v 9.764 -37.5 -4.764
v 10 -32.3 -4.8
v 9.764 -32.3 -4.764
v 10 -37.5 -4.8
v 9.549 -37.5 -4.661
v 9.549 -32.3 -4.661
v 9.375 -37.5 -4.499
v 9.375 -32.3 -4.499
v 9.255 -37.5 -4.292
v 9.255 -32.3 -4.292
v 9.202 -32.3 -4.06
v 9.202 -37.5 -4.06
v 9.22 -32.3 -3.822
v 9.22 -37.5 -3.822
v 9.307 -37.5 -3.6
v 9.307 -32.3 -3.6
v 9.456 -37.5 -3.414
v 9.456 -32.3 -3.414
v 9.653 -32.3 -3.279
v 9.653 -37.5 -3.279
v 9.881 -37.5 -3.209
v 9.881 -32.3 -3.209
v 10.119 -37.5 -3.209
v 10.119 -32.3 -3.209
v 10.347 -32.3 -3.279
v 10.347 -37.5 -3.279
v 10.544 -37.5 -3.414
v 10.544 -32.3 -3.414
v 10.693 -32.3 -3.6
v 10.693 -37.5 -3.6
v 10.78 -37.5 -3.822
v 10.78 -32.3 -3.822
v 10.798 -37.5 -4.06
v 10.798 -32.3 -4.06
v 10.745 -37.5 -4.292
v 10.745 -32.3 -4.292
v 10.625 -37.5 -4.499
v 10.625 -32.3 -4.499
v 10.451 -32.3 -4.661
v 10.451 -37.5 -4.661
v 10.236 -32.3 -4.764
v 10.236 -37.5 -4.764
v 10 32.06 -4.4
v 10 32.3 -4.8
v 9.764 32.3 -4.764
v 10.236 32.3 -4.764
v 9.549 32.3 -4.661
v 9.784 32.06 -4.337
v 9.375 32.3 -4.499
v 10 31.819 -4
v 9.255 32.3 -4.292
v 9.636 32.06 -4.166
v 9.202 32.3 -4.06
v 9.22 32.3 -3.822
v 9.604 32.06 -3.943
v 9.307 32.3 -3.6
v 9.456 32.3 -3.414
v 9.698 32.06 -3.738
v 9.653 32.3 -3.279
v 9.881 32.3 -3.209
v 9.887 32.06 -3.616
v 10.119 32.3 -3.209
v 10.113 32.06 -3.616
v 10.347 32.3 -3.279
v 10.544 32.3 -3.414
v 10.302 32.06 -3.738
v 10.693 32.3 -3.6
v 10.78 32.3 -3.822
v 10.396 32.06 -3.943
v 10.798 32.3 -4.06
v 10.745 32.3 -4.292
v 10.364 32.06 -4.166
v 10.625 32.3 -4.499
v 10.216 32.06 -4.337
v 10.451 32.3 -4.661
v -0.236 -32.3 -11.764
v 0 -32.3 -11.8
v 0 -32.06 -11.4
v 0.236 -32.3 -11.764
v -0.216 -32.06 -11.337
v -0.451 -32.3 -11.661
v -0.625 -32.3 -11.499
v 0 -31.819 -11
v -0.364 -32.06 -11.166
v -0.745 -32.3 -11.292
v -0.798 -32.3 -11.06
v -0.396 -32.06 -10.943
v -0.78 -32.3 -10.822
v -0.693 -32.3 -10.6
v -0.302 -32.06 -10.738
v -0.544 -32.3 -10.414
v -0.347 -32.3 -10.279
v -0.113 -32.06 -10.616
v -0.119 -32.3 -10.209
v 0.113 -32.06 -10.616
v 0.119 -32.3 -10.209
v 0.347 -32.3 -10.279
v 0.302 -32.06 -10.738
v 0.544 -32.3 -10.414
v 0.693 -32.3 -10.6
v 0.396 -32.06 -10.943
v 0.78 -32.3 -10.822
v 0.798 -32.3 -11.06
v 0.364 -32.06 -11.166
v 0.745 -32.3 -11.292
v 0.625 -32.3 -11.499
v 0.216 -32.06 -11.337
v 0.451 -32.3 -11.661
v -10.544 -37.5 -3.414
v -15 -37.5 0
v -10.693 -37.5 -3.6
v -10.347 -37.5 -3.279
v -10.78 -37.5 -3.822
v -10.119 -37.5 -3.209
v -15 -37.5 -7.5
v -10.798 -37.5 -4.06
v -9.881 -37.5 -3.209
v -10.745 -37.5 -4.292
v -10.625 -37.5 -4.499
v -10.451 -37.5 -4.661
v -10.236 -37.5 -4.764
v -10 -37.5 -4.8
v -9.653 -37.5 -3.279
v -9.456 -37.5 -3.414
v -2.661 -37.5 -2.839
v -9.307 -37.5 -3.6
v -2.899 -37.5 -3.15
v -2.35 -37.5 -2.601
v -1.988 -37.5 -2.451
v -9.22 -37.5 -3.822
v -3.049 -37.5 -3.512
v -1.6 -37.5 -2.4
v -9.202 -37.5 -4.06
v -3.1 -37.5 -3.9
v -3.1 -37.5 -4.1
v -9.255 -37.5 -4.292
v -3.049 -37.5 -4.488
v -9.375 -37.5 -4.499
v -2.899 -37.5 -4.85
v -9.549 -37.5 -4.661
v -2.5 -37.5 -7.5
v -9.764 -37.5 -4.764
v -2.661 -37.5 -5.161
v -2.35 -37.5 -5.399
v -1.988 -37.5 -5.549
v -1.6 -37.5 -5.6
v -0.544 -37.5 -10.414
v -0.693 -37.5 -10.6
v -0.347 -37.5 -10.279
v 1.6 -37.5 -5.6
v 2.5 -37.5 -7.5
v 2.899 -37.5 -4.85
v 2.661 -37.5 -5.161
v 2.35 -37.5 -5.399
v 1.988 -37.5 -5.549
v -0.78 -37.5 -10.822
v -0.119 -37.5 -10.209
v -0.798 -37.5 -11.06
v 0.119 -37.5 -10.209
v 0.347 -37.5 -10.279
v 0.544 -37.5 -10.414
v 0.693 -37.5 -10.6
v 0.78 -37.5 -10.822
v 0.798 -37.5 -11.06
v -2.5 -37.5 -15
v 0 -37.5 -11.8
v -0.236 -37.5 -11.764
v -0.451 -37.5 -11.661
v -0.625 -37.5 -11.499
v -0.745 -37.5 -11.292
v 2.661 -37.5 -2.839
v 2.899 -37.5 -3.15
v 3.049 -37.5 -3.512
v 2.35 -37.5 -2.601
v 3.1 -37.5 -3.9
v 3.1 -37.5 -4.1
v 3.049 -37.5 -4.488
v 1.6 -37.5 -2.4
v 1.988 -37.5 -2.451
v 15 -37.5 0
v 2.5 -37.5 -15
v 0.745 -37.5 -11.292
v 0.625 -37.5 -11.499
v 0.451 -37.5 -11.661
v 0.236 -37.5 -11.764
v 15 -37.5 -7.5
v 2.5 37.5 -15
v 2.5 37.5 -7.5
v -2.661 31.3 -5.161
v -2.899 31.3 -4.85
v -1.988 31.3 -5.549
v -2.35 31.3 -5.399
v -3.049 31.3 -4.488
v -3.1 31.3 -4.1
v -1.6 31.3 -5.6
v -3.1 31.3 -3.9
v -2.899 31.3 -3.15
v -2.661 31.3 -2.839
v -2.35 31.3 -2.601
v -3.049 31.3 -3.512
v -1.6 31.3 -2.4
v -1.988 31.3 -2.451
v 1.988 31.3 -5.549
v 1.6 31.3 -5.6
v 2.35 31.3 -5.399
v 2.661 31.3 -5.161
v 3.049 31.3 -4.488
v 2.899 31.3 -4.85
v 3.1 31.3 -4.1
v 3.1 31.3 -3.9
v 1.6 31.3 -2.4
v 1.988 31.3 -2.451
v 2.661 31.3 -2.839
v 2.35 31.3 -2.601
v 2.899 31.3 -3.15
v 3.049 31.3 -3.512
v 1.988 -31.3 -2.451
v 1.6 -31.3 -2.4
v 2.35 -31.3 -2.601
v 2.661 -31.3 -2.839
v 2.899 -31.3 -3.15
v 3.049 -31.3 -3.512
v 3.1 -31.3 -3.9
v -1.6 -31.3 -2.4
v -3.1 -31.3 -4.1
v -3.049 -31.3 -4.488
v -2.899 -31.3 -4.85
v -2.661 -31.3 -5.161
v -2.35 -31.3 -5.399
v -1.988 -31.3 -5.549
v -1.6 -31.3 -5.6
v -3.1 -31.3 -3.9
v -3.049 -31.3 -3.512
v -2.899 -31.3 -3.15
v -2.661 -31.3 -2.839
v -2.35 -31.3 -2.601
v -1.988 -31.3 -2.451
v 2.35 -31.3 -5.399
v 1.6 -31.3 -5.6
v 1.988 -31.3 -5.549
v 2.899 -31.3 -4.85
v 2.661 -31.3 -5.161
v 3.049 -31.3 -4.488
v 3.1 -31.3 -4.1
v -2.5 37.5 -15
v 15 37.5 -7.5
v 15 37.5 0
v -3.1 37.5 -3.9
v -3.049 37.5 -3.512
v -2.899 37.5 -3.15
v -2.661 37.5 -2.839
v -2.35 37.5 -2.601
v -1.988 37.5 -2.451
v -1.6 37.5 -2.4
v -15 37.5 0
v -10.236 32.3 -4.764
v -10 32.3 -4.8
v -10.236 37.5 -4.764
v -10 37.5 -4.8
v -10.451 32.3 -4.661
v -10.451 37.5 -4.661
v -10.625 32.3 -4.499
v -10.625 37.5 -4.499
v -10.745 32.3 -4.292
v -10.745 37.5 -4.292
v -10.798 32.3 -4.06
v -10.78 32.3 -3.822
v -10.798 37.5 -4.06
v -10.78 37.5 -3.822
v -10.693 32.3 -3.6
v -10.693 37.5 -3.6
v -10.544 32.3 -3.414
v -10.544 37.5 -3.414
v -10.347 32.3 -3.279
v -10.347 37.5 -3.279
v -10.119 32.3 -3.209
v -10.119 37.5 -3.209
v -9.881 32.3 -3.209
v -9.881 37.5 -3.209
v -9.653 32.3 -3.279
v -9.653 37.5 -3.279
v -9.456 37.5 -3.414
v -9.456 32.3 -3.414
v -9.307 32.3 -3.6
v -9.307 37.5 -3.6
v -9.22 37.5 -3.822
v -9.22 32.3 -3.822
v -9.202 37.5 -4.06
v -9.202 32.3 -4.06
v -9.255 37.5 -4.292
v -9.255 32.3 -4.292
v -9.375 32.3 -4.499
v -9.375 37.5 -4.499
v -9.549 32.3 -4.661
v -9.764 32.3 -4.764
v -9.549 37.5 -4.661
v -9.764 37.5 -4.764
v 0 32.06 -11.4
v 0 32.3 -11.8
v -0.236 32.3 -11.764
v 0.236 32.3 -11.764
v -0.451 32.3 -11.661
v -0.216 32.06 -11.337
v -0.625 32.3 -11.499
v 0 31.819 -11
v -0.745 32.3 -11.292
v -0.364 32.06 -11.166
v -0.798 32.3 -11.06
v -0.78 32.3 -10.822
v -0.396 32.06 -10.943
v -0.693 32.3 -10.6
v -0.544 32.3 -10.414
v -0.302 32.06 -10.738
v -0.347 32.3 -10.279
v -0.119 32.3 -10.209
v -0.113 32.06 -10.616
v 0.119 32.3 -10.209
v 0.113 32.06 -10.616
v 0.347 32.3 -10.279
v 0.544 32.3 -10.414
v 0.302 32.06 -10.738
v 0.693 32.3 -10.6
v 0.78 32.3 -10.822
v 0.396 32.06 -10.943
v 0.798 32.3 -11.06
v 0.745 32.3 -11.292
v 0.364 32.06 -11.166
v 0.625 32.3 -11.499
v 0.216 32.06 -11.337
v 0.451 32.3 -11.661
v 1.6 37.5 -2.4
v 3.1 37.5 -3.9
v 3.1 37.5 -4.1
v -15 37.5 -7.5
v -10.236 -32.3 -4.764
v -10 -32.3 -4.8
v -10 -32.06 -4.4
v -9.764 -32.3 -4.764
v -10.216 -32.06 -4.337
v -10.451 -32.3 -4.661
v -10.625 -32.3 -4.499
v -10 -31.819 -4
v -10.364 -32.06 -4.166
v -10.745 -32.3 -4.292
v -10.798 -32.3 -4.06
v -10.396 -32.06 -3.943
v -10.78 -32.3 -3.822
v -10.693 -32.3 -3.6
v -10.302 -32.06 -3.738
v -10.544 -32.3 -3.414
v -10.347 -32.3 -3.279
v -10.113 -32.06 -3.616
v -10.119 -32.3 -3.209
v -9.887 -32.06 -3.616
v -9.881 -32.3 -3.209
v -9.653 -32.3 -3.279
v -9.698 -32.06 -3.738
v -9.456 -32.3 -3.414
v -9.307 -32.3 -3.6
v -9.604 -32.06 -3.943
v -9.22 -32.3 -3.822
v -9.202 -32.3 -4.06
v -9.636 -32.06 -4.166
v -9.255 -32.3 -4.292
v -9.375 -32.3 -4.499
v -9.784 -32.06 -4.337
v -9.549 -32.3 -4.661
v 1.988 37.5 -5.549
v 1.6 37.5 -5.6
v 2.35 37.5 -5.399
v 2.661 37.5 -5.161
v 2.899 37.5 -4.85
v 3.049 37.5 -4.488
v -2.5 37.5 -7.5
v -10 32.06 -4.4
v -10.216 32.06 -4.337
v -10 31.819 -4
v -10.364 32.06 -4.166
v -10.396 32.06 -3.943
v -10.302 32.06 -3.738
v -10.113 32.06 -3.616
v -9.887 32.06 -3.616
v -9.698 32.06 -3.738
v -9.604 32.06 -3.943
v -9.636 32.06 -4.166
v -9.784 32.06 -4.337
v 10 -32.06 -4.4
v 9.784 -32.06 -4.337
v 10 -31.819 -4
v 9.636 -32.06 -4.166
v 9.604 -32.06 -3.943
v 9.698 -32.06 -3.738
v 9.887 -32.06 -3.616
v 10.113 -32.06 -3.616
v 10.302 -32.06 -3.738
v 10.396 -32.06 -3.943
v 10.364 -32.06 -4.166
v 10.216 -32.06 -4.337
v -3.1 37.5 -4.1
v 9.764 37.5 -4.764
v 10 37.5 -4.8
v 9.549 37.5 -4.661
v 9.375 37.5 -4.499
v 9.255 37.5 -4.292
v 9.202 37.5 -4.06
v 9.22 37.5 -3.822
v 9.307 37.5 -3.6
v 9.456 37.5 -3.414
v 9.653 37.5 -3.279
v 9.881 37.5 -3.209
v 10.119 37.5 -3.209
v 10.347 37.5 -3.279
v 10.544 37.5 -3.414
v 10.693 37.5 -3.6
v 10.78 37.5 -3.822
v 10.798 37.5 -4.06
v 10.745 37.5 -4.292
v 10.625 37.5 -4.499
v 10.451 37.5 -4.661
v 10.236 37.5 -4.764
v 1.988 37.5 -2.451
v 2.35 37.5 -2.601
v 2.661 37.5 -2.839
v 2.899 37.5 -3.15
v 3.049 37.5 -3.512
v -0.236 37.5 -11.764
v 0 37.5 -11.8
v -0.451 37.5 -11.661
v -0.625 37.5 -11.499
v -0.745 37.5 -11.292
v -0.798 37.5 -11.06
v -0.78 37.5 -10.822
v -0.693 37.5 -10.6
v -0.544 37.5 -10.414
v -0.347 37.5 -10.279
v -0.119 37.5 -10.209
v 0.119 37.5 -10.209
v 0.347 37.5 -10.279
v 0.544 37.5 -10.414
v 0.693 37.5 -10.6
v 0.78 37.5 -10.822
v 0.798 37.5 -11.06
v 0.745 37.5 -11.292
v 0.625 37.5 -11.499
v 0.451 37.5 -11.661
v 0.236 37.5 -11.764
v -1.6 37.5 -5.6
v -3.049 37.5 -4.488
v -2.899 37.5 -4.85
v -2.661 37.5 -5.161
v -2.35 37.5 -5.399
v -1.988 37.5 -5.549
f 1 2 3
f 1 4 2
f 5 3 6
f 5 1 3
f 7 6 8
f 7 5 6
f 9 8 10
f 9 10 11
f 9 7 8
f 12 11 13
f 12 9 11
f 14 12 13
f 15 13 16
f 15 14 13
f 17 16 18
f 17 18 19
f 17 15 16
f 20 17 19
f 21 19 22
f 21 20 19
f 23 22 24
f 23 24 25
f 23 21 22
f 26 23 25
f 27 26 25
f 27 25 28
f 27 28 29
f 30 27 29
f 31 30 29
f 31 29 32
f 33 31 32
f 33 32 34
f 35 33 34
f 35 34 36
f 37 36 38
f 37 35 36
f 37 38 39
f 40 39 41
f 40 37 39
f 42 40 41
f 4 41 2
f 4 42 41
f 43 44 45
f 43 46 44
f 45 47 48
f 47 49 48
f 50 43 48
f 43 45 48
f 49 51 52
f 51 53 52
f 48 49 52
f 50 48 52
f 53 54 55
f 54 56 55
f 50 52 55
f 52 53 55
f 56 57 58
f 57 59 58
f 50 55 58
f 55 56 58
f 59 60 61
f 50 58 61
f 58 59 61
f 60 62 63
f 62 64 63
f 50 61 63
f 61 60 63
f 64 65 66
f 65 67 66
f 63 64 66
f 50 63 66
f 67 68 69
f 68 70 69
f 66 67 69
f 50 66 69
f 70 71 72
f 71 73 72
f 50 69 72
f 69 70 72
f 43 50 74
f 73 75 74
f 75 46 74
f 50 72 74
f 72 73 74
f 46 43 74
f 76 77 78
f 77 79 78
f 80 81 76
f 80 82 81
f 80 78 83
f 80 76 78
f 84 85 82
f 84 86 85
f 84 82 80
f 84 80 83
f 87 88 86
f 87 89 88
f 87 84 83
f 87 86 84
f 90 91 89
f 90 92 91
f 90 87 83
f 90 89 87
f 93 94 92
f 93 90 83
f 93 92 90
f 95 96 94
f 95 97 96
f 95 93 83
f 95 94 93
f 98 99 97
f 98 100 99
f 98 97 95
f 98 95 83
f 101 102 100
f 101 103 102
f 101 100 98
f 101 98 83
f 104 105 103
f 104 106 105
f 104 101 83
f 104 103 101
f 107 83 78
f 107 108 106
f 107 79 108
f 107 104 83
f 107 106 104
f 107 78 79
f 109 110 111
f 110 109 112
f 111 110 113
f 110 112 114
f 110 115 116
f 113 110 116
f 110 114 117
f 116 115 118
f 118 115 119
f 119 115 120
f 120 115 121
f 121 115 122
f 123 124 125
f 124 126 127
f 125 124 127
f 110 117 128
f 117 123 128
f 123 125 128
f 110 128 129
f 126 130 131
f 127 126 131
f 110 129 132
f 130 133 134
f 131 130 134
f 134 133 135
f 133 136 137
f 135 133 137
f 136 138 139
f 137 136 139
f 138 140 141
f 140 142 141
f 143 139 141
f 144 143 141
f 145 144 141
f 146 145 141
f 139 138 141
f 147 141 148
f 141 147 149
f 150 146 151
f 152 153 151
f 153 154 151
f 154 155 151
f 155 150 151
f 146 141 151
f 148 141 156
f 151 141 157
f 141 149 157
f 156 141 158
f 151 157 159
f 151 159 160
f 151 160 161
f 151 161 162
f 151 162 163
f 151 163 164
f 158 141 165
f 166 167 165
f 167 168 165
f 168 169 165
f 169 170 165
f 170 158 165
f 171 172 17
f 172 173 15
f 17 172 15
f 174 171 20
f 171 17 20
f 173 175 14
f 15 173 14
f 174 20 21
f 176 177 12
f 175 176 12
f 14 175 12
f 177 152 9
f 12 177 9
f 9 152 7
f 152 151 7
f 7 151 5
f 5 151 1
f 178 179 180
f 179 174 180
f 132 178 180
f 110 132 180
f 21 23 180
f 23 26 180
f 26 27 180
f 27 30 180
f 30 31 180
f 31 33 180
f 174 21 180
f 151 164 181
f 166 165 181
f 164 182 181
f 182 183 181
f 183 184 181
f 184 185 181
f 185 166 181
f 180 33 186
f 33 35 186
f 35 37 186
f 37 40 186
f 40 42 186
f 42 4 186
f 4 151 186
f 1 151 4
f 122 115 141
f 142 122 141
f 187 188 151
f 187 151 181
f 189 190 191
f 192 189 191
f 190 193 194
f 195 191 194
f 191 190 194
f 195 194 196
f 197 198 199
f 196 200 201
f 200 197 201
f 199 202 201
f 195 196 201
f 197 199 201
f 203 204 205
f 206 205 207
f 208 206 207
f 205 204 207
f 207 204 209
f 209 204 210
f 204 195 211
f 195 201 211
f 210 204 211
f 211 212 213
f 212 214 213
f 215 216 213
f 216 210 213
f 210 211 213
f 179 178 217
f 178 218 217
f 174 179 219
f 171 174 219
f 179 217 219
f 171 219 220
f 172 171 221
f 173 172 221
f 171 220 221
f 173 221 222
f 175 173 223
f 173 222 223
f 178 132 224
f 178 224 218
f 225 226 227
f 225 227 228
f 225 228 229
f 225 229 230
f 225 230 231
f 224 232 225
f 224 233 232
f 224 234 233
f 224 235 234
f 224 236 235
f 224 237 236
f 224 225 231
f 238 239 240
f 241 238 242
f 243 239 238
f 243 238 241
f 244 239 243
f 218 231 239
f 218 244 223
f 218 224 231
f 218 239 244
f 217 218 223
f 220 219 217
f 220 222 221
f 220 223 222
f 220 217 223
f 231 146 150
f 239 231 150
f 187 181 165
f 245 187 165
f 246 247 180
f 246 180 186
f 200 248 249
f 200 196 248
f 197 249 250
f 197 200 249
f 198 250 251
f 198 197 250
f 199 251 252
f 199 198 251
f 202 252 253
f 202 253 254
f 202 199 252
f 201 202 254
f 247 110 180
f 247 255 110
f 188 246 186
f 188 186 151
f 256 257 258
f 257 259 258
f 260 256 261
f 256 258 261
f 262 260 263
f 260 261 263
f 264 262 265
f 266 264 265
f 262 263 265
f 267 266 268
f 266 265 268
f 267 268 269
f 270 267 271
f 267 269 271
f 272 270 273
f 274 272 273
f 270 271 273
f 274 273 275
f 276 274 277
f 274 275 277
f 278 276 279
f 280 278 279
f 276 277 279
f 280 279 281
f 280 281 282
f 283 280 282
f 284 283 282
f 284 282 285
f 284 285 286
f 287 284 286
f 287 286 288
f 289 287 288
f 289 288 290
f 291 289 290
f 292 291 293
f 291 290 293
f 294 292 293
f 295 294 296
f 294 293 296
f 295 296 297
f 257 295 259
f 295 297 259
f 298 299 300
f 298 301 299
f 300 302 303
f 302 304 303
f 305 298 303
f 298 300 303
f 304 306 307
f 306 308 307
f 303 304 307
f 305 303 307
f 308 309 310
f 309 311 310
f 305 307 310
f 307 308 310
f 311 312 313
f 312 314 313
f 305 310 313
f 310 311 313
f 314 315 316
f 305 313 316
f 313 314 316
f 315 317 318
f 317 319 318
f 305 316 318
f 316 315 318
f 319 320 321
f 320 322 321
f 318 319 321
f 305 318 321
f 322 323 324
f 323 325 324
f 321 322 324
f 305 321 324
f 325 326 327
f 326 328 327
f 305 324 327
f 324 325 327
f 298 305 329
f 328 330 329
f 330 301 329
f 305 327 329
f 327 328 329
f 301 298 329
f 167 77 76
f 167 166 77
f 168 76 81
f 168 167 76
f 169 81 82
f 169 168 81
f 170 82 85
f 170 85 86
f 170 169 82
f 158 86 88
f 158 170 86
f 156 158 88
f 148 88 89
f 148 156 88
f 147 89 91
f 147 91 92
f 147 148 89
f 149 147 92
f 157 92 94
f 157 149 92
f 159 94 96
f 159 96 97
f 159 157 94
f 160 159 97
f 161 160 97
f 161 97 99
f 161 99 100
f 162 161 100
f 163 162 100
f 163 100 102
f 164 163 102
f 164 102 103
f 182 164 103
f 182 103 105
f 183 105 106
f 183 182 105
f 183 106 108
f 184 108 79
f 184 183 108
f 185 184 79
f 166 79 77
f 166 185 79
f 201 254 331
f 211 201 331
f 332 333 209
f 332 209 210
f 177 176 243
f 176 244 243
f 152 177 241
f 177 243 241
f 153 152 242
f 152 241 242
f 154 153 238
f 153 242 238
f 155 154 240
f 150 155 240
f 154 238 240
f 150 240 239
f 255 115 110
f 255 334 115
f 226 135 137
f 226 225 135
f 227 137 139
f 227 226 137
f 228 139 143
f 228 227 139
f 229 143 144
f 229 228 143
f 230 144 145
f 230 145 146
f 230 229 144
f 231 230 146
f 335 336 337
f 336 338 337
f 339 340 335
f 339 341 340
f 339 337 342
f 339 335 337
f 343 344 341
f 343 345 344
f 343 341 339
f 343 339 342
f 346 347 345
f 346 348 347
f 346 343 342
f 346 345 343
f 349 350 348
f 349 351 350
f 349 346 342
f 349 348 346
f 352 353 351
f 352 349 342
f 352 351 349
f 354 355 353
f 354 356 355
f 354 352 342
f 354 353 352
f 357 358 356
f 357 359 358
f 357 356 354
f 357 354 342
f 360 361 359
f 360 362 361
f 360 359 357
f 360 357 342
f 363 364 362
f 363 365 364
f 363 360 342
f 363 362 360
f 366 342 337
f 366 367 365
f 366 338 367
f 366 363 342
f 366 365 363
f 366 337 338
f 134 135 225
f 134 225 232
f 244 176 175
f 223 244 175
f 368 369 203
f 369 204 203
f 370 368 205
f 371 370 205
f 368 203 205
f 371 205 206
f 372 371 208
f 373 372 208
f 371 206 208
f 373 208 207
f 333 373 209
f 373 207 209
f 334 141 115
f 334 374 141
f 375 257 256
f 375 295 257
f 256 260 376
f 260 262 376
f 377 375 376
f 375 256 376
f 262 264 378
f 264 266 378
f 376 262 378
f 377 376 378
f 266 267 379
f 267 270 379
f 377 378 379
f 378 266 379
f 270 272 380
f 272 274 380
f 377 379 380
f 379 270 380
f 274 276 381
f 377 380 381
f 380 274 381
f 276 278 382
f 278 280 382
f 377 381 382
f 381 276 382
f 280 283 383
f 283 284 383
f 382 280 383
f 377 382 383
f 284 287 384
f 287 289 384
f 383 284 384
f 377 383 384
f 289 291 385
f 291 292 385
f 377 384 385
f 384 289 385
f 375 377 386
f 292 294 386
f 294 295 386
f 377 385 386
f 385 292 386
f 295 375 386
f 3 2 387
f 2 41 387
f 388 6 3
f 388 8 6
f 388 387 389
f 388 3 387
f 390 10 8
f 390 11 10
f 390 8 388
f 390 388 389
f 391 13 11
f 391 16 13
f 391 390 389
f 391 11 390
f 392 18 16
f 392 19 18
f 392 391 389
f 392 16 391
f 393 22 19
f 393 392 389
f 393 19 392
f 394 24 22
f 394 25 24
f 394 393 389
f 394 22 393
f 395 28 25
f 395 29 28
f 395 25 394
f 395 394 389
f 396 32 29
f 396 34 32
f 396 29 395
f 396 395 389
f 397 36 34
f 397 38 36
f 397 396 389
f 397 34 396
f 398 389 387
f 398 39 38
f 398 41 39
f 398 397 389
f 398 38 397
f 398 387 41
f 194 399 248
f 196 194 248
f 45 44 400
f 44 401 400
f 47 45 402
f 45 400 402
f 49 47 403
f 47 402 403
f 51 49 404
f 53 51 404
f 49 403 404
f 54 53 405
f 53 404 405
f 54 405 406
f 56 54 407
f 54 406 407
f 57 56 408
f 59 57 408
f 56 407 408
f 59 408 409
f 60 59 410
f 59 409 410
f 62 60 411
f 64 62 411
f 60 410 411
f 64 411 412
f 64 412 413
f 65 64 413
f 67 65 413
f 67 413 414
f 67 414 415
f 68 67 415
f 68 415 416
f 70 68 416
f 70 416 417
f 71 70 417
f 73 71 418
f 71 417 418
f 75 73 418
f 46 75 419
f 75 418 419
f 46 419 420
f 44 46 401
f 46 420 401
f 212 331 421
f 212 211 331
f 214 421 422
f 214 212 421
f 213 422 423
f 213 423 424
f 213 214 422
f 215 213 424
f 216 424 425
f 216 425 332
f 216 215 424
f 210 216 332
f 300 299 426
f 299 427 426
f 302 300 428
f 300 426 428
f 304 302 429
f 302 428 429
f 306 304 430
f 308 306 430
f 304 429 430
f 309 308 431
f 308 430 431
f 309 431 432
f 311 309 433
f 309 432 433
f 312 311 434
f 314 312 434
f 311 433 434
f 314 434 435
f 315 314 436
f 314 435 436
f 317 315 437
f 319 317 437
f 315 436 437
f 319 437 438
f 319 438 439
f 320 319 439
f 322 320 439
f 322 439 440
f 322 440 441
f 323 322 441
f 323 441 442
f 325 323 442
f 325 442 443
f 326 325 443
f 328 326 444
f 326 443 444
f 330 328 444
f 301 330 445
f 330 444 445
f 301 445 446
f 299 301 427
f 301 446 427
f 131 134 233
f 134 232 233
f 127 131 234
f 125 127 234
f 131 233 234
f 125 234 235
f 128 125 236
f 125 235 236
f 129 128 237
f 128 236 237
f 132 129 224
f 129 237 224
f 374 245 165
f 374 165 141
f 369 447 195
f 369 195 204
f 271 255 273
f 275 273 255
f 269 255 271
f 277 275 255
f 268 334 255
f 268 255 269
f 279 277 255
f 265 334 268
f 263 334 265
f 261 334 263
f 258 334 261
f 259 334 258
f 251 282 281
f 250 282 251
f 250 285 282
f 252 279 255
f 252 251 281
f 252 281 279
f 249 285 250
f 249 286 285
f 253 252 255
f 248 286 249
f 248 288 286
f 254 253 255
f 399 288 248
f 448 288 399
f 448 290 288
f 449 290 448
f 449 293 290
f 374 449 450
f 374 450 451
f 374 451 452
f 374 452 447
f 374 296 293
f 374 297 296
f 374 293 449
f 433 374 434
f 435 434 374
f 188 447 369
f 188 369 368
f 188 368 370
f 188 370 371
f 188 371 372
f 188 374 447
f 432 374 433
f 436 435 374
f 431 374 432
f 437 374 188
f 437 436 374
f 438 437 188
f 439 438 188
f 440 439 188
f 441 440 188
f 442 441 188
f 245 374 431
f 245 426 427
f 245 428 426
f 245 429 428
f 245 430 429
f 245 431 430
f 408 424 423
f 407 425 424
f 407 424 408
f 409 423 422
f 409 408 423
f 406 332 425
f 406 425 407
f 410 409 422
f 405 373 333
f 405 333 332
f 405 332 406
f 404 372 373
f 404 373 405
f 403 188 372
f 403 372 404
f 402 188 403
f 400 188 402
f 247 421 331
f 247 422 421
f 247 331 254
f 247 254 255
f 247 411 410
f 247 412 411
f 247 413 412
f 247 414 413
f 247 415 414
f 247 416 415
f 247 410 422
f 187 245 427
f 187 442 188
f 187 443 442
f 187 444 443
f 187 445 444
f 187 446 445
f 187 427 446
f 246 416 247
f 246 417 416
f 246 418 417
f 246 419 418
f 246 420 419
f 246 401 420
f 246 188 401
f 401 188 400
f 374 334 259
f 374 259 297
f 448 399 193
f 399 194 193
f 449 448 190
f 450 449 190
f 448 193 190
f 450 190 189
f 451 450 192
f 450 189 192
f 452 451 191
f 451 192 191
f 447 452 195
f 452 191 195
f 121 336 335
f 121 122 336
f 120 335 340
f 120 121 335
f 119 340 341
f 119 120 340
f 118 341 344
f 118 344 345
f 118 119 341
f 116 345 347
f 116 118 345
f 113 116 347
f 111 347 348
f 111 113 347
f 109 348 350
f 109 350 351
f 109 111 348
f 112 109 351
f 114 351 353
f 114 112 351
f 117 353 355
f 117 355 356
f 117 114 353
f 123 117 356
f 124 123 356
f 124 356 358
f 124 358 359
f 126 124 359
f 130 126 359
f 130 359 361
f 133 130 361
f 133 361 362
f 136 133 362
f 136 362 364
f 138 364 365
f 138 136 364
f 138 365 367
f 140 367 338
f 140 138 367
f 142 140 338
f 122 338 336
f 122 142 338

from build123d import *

# Parameters (mm, degrees)
BOSS_EXTRUDE1_DEPTH        = 37.5
SKETCH2_W                  = 6.2
SKETCH2_H                  = 3.2
CUT_EXTRUDE1_DEPTH         = 6.2
FILLET1_R                  = 1.5
M2_TAPPED_HOLE1_AT_2_COUNT = 2
M2_TAPPED_HOLE1_AT_2_PITCH = 12.206555616
M2_TAPPED_HOLE1_AT_3_COUNT = 2
M2_TAPPED_HOLE1_AT_3_PITCH = 20
FILLET1_OF_MIRROR1_R       = 1.5


with BuildPart() as part:
    # Sketch1 → Boss-Extrude1 (new body, symmetric)
    with BuildSketch(Plane(origin=(0, 0, 0), x_dir=(1, 0, 0), z_dir=(0, 1, 0))):
        Polygon((-15, 0), (15, 0), (15, 7.5), (2.5, 7.5), (2.5, 15), (-2.5, 15), (-2.5, 7.5), (-15, 7.5), align=None)
    extrude(amount=BOSS_EXTRUDE1_DEPTH, both=True)

    # Sketch2 → Cut-Extrude1 (cut)
    with BuildSketch(Plane.XZ.offset(37.5)):
        with Locations((0, -4)):
            Rectangle(SKETCH2_W, SKETCH2_H)
    cut_extrude1 = extrude(amount=-CUT_EXTRUDE1_DEPTH, mode=Mode.SUBTRACT)

    # Fillet1
    fillet1_edges = [part.edges().sort_by_distance(p)[0] for p in [
        (-3.1, -34.4, -5.6),
        (-3.1, -34.4, -2.4),
        (3.1, -34.4, -2.4),
        (3.1, -34.4, -5.6),
    ]]
    fillet(fillet1_edges, radius=FILLET1_R)

    # Sketch6 → M2 Tapped Hole1 (revolve, cut)
    with BuildSketch(Plane(origin=(-10, -37.5, -4), x_dir=(0, 0, -1), z_dir=(1, 0, 0))):
        Polygon((0, 0), (0, 5.680688495), (0.8, 5.2), (0.8, 0), align=None)
    m2_tapped_hole1 = revolve(axis=Axis((-10, -43.85, -4), (0, 1, 0)), mode=Mode.SUBTRACT)

    # M2 Tapped Hole1 at 2: M2 Tapped Hole1 ×2
    with Locations(*[Vector(0.819231921, 0, -0.573462344) * (i * M2_TAPPED_HOLE1_AT_2_PITCH) for i in range(1, M2_TAPPED_HOLE1_AT_2_COUNT)]):
        add(m2_tapped_hole1, mode=Mode.SUBTRACT)

    # M2 Tapped Hole1 at 3: M2 Tapped Hole1 ×2
    with Locations(*[(i * M2_TAPPED_HOLE1_AT_3_PITCH, 0, 0) for i in range(1, M2_TAPPED_HOLE1_AT_3_COUNT)]):
        add(m2_tapped_hole1, mode=Mode.SUBTRACT)

    # Mirror1: M2 Tapped Hole1, Cut-Extrude1 across plane
    add(m2_tapped_hole1.mirror(Plane.ZX), mode=Mode.SUBTRACT)
    add(cut_extrude1.mirror(Plane.ZX), mode=Mode.SUBTRACT)

    # Mirror1 copy 1 sketch → Mirror1 copy 1 (revolve, cut)
    with BuildSketch(Plane(origin=(0, 37.5, -11), x_dir=(0, 0, -1), z_dir=(1, 0, 0))):
        Polygon((0, 0), (0, -5.680688495), (0.8, -5.2), (0.8, 0), align=None)
    revolve(axis=Axis((0, 43.85, -11), (0, 1, 0)), mode=Mode.SUBTRACT)

    # Mirror1 copy 2 sketch → Mirror1 copy 2 (revolve, cut)
    with BuildSketch(Plane(origin=(10, 37.5, -4), x_dir=(0, 0, -1), z_dir=(1, 0, 0))):
        Polygon((0, 0), (0, -5.680688495), (0.8, -5.2), (0.8, 0), align=None)
    revolve(axis=Axis((10, 43.85, -4), (0, 1, 0)), mode=Mode.SUBTRACT)

    # Fillet1 of Mirror1
    fillet1_of_mirror1_edges = [part.edges().sort_by_distance(p)[0] for p in [
        (-3.1, 34.4, -5.6),
        (-3.1, 34.4, -2.4),
        (3.1, 34.4, -2.4),
        (3.1, 34.4, -5.6),
    ]]
    fillet(fillet1_of_mirror1_edges, radius=FILLET1_OF_MIRROR1_R)


solid = part.part
